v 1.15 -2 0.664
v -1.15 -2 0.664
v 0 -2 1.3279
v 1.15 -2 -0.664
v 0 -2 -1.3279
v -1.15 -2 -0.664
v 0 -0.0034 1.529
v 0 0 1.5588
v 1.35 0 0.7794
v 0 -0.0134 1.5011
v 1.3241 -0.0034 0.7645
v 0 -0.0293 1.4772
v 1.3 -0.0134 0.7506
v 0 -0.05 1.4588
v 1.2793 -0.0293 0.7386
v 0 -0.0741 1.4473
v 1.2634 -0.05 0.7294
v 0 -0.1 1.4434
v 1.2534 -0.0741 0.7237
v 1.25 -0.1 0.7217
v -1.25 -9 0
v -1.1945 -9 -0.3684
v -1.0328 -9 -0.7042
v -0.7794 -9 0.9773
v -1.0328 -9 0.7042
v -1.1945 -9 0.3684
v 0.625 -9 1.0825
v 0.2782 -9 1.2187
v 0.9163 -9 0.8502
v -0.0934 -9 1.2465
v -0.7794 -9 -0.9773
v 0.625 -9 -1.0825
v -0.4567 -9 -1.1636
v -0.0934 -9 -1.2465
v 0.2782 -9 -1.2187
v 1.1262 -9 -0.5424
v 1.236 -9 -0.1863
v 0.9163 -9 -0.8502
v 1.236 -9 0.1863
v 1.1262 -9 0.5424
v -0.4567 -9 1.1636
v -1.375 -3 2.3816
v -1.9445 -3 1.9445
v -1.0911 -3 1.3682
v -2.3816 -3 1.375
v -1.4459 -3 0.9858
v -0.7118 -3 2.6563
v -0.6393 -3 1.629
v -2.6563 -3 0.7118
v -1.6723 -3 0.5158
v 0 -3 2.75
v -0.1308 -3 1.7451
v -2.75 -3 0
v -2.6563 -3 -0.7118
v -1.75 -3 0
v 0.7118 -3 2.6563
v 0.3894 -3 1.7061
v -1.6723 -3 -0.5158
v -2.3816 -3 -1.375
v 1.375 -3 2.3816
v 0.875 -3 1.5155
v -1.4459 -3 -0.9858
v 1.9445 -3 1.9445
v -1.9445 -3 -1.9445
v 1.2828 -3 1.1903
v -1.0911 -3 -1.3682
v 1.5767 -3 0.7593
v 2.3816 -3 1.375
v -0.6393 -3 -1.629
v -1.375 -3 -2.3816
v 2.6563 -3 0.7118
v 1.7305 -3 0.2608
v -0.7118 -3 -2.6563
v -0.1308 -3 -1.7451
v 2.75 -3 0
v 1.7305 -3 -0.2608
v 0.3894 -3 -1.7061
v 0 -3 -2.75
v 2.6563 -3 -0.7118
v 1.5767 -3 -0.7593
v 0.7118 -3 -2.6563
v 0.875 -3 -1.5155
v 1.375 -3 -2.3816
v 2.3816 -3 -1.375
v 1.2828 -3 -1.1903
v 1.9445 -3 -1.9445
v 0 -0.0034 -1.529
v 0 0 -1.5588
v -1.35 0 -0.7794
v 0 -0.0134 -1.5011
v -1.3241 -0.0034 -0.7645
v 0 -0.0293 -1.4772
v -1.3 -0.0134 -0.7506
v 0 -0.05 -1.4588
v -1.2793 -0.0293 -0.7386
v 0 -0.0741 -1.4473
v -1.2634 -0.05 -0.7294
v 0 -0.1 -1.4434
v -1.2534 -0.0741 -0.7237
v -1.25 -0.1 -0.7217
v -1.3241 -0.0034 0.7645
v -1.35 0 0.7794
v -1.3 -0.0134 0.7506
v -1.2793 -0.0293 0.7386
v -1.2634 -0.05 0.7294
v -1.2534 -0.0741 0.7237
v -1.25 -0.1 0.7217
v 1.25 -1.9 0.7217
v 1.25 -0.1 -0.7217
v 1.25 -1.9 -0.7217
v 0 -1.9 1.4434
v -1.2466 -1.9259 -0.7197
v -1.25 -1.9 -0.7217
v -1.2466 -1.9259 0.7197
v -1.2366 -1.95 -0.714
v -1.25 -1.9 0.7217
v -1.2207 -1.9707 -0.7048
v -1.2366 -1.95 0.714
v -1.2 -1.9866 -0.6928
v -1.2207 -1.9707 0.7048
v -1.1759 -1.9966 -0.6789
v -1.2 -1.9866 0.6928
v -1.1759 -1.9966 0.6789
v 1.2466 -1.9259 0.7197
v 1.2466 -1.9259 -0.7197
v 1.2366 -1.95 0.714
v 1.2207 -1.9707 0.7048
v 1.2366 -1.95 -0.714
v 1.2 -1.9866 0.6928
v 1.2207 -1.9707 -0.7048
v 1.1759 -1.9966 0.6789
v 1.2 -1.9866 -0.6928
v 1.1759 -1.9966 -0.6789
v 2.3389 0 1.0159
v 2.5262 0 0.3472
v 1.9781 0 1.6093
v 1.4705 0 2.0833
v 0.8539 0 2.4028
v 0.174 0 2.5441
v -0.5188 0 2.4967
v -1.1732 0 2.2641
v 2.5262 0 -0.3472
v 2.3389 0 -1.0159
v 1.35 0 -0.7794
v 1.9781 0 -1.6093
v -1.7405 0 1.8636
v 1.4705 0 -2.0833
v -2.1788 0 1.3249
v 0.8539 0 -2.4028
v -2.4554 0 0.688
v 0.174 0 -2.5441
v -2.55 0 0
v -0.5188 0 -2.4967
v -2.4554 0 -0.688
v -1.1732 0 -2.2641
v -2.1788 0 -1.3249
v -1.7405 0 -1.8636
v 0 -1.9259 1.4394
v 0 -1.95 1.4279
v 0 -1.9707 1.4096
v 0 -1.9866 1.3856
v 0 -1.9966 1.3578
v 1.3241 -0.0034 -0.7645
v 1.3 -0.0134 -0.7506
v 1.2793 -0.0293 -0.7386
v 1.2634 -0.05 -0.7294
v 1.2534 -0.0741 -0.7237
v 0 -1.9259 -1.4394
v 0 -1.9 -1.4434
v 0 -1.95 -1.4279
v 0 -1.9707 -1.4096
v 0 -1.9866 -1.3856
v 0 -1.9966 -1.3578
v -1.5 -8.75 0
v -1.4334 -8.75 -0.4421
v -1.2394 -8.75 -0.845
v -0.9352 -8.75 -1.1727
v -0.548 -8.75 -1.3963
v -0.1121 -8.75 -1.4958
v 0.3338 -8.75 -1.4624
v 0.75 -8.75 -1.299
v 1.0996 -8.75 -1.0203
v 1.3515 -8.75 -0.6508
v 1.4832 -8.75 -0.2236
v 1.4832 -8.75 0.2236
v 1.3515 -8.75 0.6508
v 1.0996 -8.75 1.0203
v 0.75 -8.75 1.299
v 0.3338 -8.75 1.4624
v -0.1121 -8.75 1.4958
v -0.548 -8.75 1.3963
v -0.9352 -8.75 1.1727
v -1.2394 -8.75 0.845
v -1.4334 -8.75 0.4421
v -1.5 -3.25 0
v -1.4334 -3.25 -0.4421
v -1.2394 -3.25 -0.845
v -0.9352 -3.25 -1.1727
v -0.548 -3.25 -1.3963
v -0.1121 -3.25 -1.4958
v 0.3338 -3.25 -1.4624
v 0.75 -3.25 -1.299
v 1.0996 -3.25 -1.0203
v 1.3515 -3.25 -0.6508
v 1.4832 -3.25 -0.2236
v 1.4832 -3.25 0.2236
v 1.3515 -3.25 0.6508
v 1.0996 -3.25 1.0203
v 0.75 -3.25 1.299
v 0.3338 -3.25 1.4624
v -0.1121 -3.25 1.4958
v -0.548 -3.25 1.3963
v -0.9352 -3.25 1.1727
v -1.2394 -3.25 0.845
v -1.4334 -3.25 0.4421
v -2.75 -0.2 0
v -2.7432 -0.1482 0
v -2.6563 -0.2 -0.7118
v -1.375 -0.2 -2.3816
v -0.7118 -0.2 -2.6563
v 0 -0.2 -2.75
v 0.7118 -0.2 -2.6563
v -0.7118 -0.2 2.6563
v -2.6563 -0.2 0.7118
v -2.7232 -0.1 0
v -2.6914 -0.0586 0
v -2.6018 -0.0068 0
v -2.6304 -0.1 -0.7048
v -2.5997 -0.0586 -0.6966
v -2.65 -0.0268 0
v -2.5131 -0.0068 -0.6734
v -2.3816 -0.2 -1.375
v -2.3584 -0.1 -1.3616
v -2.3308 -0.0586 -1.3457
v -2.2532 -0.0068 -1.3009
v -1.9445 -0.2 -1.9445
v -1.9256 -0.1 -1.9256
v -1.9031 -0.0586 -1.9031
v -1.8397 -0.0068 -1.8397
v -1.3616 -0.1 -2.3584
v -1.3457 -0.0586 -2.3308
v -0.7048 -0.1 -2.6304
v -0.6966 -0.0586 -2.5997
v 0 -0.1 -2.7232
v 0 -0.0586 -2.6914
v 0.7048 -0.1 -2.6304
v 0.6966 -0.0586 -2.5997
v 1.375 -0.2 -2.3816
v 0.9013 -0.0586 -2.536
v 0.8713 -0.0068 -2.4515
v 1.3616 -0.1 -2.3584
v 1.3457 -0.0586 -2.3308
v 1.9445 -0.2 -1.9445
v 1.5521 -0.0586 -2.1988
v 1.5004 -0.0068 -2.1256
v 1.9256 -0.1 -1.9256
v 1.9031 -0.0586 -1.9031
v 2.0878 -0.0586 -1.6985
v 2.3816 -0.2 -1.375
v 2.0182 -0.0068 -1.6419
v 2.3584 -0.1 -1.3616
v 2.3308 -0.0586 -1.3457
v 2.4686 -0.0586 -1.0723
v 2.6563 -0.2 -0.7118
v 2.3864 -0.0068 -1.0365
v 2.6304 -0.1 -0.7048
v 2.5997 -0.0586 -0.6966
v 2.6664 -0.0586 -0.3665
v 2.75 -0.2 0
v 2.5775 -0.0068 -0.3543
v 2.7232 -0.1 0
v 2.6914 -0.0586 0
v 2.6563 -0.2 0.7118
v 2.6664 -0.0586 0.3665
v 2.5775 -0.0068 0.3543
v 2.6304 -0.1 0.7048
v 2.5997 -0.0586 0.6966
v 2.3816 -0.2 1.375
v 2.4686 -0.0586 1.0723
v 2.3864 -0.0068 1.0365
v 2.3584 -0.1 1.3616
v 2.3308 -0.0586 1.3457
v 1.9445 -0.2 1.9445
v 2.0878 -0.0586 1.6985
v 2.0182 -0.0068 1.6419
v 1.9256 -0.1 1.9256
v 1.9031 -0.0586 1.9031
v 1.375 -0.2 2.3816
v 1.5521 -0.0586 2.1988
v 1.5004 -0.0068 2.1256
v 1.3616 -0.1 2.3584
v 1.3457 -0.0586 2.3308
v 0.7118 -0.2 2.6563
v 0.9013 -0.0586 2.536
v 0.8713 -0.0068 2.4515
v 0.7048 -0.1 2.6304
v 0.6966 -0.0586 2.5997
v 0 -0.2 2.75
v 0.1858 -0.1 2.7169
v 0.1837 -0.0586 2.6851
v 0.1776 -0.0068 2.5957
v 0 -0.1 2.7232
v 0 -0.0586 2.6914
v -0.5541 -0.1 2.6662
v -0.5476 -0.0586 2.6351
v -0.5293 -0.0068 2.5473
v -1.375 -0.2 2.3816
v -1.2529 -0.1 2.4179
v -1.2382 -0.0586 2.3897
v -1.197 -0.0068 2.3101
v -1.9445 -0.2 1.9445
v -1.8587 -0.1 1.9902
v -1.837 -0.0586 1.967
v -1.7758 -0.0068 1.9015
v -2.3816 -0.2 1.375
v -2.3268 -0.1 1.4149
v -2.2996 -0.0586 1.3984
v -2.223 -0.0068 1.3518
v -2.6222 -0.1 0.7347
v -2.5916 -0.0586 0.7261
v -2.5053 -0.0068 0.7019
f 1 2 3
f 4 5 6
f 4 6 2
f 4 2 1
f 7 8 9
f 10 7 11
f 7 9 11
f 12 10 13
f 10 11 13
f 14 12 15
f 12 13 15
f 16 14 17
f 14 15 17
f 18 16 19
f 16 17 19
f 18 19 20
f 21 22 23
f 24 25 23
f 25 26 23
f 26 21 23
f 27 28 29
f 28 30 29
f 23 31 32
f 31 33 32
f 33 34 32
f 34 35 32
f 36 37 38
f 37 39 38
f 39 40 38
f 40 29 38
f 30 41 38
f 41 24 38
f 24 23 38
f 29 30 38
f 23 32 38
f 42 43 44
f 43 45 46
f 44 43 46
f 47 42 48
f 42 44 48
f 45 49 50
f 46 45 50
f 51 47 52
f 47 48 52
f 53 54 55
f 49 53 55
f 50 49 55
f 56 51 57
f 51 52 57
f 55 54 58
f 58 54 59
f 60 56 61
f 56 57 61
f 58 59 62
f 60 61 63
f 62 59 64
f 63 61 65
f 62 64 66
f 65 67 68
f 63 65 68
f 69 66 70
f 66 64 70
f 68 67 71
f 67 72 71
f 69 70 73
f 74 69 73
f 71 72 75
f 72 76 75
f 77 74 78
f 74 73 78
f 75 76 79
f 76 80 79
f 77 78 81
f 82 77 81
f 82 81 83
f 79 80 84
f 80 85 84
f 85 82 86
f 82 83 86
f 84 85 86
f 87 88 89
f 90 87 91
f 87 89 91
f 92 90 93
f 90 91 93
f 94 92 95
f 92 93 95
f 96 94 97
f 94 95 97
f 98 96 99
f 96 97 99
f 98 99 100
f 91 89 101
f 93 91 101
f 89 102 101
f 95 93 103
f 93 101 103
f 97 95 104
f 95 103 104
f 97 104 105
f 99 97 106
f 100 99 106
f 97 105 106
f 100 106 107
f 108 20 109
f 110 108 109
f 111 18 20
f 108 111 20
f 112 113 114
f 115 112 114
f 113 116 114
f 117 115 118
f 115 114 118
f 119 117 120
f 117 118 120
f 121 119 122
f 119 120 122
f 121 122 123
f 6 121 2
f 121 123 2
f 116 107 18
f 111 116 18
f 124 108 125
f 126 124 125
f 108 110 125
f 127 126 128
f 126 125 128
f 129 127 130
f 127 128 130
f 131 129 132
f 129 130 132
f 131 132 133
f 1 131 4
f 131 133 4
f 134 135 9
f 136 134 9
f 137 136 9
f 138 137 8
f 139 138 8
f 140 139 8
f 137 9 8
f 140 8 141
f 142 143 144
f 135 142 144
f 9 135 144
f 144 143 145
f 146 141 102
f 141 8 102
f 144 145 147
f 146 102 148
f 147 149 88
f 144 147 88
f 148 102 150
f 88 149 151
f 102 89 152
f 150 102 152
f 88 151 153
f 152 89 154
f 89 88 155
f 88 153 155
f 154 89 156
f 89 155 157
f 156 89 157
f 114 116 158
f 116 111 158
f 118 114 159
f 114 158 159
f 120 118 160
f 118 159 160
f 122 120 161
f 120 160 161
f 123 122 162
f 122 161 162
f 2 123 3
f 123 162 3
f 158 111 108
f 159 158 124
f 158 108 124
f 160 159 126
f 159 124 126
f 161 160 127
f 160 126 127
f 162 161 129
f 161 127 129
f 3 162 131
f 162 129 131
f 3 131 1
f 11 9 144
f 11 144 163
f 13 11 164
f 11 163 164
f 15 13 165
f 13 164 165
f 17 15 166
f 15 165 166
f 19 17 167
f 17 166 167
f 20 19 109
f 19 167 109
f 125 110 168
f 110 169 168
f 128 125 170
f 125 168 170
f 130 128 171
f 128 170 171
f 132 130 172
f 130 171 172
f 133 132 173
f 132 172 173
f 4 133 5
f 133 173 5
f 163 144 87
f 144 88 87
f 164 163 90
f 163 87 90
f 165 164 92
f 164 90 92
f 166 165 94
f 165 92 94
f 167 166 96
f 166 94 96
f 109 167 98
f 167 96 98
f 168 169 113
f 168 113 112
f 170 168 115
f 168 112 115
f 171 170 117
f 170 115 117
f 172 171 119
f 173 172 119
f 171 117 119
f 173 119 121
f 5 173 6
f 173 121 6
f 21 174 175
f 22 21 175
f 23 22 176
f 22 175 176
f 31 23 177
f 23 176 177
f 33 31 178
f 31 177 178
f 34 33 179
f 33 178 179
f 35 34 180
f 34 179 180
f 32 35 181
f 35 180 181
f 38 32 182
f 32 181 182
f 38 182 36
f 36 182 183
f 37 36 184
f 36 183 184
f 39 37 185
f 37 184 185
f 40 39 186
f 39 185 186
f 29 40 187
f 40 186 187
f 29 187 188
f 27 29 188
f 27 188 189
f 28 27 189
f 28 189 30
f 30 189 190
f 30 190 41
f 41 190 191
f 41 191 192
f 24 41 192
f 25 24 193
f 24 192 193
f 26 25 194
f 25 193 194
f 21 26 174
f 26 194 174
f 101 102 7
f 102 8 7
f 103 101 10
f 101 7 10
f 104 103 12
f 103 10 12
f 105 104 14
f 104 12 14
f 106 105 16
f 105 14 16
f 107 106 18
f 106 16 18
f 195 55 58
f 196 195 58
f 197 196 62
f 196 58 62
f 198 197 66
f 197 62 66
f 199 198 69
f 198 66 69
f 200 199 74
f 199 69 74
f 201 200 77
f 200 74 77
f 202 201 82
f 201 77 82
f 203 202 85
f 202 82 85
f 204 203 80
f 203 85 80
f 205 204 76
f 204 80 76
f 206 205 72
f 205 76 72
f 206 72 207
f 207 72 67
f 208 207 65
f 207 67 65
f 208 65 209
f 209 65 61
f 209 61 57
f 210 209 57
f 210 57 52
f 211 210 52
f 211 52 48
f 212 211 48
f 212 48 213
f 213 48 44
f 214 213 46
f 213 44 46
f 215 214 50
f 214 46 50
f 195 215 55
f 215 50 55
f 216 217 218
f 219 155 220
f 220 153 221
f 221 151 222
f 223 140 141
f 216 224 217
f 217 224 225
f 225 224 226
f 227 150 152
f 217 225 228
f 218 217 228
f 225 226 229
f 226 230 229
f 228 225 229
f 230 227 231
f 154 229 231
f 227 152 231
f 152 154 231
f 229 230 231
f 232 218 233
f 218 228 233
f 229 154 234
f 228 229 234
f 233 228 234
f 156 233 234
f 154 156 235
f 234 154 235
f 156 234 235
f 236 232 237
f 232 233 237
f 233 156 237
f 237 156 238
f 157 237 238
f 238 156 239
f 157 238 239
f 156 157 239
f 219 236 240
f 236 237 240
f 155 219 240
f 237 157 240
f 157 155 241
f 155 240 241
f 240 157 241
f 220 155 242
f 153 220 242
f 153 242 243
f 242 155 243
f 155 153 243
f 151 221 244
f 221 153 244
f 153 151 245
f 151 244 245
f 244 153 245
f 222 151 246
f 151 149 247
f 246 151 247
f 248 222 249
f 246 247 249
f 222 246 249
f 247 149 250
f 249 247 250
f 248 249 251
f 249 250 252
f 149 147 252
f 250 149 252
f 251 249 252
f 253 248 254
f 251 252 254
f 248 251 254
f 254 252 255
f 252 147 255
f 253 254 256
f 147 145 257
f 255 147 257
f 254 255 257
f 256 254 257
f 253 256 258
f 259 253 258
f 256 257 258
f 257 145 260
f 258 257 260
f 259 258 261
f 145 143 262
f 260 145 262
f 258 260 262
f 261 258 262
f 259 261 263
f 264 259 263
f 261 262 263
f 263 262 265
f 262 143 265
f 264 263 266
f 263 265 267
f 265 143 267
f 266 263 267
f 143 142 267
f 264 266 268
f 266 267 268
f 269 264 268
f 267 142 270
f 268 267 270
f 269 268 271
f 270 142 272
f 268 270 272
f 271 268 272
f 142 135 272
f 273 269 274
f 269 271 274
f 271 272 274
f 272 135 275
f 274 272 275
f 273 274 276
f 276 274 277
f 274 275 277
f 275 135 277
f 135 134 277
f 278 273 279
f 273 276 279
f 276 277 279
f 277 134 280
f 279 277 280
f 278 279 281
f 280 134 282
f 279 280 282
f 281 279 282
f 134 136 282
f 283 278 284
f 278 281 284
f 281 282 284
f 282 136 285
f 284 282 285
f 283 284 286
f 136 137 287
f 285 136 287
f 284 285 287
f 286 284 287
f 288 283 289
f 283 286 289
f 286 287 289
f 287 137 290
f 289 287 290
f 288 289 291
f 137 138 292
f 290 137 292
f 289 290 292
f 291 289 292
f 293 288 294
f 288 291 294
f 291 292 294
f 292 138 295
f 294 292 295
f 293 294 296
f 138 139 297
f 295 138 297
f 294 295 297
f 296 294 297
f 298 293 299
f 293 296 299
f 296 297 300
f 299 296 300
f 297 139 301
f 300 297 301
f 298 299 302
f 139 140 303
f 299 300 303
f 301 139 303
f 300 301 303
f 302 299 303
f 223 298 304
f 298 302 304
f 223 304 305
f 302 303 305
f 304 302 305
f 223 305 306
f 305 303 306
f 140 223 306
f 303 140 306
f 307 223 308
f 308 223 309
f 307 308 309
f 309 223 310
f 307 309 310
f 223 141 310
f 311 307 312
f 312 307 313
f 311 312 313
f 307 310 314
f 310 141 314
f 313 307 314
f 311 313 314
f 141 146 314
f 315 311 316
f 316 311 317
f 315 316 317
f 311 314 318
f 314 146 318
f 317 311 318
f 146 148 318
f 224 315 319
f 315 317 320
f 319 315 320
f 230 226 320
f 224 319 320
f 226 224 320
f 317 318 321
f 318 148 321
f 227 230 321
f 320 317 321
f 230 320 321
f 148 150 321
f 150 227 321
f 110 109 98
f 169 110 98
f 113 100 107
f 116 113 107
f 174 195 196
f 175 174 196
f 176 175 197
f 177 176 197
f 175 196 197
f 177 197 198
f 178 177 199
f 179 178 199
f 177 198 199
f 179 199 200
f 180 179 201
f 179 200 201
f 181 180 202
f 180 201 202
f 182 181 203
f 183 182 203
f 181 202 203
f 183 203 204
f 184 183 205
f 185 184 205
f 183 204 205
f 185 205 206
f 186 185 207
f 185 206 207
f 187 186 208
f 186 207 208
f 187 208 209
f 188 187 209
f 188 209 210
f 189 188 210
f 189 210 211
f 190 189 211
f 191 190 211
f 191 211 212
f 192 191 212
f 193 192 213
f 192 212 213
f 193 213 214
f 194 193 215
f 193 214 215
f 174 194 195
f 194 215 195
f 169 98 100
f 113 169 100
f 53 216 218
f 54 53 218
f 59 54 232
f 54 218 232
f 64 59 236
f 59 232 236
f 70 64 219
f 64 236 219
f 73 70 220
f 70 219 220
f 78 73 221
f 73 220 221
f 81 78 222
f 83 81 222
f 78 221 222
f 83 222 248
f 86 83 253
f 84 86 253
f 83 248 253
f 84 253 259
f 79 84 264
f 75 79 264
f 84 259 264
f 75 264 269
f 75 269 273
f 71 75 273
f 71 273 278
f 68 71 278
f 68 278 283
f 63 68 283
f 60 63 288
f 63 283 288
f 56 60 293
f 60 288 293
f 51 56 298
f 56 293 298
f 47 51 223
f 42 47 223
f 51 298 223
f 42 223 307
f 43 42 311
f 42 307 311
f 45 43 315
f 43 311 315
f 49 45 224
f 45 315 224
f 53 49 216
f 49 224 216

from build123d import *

# Parameters (mm, degrees)
CHAMFER1_SIZE      = 0.25
FILLET1_R          = 0.2
CUT_EXTRUDE1_DEPTH = 2
FILLET2_R          = 0.1


with BuildPart() as part:
    # Sketch1 → Revolve1 (revolve)
    with BuildSketch(Plane.XY):
        Polygon((0, -9), (-1.5, -9), (-1.5, -3), (-2.75, -3), (-2.75, 0), (0, 0), align=None)
    revolve(axis=Axis((0, 0, 0), (0, -1, 0)))

    # Chamfer1
    chamfer1_edges = [part.edges().sort_by_distance(p)[0] for p in [
        (1.5, -3, 0),
        (1.5, -9, 0),
    ]]
    chamfer(chamfer1_edges, length=CHAMFER1_SIZE)

    # Fillet1
    fillet1_edges = [part.edges().sort_by_distance(p)[0] for p in [
        (2.75, 0, 0),
    ]]
    fillet(fillet1_edges, radius=FILLET1_R)

    # Sketch2 → Cut-Extrude1 (cut)
    with BuildSketch(Plane(origin=(0, 0, 0), x_dir=(1, 0, 0), z_dir=(0, 1, 0))):
        Polygon((0, 1.443375673), (-1.25, 0.721687836), (-1.25, -0.721687836), (0, -1.443375673), (1.25, -0.721687836), (1.25, 0.721687836), align=None)
    extrude(amount=-CUT_EXTRUDE1_DEPTH, mode=Mode.SUBTRACT)

    # Fillet2
    fillet2_edges = [part.edges().sort_by_distance(p)[0] for p in [
        (0.625, -2, -1.082531755),
        (1.25, -2, 0),
        (0.625, -2, 1.082531755),
        (-0.625, -2, 1.082531755),
        (-1.25, -2, 0),
        (-0.625, -2, -1.082531755),
        (0.625, 0, -1.082531755),
        (-0.625, 0, -1.082531755),
        (-1.25, 0, 0),
        (-0.625, 0, 1.082531755),
        (0.625, 0, 1.082531755),
        (1.25, 0, 0),
    ]]
    fillet(fillet2_edges, radius=FILLET2_R)


solid = part.part
